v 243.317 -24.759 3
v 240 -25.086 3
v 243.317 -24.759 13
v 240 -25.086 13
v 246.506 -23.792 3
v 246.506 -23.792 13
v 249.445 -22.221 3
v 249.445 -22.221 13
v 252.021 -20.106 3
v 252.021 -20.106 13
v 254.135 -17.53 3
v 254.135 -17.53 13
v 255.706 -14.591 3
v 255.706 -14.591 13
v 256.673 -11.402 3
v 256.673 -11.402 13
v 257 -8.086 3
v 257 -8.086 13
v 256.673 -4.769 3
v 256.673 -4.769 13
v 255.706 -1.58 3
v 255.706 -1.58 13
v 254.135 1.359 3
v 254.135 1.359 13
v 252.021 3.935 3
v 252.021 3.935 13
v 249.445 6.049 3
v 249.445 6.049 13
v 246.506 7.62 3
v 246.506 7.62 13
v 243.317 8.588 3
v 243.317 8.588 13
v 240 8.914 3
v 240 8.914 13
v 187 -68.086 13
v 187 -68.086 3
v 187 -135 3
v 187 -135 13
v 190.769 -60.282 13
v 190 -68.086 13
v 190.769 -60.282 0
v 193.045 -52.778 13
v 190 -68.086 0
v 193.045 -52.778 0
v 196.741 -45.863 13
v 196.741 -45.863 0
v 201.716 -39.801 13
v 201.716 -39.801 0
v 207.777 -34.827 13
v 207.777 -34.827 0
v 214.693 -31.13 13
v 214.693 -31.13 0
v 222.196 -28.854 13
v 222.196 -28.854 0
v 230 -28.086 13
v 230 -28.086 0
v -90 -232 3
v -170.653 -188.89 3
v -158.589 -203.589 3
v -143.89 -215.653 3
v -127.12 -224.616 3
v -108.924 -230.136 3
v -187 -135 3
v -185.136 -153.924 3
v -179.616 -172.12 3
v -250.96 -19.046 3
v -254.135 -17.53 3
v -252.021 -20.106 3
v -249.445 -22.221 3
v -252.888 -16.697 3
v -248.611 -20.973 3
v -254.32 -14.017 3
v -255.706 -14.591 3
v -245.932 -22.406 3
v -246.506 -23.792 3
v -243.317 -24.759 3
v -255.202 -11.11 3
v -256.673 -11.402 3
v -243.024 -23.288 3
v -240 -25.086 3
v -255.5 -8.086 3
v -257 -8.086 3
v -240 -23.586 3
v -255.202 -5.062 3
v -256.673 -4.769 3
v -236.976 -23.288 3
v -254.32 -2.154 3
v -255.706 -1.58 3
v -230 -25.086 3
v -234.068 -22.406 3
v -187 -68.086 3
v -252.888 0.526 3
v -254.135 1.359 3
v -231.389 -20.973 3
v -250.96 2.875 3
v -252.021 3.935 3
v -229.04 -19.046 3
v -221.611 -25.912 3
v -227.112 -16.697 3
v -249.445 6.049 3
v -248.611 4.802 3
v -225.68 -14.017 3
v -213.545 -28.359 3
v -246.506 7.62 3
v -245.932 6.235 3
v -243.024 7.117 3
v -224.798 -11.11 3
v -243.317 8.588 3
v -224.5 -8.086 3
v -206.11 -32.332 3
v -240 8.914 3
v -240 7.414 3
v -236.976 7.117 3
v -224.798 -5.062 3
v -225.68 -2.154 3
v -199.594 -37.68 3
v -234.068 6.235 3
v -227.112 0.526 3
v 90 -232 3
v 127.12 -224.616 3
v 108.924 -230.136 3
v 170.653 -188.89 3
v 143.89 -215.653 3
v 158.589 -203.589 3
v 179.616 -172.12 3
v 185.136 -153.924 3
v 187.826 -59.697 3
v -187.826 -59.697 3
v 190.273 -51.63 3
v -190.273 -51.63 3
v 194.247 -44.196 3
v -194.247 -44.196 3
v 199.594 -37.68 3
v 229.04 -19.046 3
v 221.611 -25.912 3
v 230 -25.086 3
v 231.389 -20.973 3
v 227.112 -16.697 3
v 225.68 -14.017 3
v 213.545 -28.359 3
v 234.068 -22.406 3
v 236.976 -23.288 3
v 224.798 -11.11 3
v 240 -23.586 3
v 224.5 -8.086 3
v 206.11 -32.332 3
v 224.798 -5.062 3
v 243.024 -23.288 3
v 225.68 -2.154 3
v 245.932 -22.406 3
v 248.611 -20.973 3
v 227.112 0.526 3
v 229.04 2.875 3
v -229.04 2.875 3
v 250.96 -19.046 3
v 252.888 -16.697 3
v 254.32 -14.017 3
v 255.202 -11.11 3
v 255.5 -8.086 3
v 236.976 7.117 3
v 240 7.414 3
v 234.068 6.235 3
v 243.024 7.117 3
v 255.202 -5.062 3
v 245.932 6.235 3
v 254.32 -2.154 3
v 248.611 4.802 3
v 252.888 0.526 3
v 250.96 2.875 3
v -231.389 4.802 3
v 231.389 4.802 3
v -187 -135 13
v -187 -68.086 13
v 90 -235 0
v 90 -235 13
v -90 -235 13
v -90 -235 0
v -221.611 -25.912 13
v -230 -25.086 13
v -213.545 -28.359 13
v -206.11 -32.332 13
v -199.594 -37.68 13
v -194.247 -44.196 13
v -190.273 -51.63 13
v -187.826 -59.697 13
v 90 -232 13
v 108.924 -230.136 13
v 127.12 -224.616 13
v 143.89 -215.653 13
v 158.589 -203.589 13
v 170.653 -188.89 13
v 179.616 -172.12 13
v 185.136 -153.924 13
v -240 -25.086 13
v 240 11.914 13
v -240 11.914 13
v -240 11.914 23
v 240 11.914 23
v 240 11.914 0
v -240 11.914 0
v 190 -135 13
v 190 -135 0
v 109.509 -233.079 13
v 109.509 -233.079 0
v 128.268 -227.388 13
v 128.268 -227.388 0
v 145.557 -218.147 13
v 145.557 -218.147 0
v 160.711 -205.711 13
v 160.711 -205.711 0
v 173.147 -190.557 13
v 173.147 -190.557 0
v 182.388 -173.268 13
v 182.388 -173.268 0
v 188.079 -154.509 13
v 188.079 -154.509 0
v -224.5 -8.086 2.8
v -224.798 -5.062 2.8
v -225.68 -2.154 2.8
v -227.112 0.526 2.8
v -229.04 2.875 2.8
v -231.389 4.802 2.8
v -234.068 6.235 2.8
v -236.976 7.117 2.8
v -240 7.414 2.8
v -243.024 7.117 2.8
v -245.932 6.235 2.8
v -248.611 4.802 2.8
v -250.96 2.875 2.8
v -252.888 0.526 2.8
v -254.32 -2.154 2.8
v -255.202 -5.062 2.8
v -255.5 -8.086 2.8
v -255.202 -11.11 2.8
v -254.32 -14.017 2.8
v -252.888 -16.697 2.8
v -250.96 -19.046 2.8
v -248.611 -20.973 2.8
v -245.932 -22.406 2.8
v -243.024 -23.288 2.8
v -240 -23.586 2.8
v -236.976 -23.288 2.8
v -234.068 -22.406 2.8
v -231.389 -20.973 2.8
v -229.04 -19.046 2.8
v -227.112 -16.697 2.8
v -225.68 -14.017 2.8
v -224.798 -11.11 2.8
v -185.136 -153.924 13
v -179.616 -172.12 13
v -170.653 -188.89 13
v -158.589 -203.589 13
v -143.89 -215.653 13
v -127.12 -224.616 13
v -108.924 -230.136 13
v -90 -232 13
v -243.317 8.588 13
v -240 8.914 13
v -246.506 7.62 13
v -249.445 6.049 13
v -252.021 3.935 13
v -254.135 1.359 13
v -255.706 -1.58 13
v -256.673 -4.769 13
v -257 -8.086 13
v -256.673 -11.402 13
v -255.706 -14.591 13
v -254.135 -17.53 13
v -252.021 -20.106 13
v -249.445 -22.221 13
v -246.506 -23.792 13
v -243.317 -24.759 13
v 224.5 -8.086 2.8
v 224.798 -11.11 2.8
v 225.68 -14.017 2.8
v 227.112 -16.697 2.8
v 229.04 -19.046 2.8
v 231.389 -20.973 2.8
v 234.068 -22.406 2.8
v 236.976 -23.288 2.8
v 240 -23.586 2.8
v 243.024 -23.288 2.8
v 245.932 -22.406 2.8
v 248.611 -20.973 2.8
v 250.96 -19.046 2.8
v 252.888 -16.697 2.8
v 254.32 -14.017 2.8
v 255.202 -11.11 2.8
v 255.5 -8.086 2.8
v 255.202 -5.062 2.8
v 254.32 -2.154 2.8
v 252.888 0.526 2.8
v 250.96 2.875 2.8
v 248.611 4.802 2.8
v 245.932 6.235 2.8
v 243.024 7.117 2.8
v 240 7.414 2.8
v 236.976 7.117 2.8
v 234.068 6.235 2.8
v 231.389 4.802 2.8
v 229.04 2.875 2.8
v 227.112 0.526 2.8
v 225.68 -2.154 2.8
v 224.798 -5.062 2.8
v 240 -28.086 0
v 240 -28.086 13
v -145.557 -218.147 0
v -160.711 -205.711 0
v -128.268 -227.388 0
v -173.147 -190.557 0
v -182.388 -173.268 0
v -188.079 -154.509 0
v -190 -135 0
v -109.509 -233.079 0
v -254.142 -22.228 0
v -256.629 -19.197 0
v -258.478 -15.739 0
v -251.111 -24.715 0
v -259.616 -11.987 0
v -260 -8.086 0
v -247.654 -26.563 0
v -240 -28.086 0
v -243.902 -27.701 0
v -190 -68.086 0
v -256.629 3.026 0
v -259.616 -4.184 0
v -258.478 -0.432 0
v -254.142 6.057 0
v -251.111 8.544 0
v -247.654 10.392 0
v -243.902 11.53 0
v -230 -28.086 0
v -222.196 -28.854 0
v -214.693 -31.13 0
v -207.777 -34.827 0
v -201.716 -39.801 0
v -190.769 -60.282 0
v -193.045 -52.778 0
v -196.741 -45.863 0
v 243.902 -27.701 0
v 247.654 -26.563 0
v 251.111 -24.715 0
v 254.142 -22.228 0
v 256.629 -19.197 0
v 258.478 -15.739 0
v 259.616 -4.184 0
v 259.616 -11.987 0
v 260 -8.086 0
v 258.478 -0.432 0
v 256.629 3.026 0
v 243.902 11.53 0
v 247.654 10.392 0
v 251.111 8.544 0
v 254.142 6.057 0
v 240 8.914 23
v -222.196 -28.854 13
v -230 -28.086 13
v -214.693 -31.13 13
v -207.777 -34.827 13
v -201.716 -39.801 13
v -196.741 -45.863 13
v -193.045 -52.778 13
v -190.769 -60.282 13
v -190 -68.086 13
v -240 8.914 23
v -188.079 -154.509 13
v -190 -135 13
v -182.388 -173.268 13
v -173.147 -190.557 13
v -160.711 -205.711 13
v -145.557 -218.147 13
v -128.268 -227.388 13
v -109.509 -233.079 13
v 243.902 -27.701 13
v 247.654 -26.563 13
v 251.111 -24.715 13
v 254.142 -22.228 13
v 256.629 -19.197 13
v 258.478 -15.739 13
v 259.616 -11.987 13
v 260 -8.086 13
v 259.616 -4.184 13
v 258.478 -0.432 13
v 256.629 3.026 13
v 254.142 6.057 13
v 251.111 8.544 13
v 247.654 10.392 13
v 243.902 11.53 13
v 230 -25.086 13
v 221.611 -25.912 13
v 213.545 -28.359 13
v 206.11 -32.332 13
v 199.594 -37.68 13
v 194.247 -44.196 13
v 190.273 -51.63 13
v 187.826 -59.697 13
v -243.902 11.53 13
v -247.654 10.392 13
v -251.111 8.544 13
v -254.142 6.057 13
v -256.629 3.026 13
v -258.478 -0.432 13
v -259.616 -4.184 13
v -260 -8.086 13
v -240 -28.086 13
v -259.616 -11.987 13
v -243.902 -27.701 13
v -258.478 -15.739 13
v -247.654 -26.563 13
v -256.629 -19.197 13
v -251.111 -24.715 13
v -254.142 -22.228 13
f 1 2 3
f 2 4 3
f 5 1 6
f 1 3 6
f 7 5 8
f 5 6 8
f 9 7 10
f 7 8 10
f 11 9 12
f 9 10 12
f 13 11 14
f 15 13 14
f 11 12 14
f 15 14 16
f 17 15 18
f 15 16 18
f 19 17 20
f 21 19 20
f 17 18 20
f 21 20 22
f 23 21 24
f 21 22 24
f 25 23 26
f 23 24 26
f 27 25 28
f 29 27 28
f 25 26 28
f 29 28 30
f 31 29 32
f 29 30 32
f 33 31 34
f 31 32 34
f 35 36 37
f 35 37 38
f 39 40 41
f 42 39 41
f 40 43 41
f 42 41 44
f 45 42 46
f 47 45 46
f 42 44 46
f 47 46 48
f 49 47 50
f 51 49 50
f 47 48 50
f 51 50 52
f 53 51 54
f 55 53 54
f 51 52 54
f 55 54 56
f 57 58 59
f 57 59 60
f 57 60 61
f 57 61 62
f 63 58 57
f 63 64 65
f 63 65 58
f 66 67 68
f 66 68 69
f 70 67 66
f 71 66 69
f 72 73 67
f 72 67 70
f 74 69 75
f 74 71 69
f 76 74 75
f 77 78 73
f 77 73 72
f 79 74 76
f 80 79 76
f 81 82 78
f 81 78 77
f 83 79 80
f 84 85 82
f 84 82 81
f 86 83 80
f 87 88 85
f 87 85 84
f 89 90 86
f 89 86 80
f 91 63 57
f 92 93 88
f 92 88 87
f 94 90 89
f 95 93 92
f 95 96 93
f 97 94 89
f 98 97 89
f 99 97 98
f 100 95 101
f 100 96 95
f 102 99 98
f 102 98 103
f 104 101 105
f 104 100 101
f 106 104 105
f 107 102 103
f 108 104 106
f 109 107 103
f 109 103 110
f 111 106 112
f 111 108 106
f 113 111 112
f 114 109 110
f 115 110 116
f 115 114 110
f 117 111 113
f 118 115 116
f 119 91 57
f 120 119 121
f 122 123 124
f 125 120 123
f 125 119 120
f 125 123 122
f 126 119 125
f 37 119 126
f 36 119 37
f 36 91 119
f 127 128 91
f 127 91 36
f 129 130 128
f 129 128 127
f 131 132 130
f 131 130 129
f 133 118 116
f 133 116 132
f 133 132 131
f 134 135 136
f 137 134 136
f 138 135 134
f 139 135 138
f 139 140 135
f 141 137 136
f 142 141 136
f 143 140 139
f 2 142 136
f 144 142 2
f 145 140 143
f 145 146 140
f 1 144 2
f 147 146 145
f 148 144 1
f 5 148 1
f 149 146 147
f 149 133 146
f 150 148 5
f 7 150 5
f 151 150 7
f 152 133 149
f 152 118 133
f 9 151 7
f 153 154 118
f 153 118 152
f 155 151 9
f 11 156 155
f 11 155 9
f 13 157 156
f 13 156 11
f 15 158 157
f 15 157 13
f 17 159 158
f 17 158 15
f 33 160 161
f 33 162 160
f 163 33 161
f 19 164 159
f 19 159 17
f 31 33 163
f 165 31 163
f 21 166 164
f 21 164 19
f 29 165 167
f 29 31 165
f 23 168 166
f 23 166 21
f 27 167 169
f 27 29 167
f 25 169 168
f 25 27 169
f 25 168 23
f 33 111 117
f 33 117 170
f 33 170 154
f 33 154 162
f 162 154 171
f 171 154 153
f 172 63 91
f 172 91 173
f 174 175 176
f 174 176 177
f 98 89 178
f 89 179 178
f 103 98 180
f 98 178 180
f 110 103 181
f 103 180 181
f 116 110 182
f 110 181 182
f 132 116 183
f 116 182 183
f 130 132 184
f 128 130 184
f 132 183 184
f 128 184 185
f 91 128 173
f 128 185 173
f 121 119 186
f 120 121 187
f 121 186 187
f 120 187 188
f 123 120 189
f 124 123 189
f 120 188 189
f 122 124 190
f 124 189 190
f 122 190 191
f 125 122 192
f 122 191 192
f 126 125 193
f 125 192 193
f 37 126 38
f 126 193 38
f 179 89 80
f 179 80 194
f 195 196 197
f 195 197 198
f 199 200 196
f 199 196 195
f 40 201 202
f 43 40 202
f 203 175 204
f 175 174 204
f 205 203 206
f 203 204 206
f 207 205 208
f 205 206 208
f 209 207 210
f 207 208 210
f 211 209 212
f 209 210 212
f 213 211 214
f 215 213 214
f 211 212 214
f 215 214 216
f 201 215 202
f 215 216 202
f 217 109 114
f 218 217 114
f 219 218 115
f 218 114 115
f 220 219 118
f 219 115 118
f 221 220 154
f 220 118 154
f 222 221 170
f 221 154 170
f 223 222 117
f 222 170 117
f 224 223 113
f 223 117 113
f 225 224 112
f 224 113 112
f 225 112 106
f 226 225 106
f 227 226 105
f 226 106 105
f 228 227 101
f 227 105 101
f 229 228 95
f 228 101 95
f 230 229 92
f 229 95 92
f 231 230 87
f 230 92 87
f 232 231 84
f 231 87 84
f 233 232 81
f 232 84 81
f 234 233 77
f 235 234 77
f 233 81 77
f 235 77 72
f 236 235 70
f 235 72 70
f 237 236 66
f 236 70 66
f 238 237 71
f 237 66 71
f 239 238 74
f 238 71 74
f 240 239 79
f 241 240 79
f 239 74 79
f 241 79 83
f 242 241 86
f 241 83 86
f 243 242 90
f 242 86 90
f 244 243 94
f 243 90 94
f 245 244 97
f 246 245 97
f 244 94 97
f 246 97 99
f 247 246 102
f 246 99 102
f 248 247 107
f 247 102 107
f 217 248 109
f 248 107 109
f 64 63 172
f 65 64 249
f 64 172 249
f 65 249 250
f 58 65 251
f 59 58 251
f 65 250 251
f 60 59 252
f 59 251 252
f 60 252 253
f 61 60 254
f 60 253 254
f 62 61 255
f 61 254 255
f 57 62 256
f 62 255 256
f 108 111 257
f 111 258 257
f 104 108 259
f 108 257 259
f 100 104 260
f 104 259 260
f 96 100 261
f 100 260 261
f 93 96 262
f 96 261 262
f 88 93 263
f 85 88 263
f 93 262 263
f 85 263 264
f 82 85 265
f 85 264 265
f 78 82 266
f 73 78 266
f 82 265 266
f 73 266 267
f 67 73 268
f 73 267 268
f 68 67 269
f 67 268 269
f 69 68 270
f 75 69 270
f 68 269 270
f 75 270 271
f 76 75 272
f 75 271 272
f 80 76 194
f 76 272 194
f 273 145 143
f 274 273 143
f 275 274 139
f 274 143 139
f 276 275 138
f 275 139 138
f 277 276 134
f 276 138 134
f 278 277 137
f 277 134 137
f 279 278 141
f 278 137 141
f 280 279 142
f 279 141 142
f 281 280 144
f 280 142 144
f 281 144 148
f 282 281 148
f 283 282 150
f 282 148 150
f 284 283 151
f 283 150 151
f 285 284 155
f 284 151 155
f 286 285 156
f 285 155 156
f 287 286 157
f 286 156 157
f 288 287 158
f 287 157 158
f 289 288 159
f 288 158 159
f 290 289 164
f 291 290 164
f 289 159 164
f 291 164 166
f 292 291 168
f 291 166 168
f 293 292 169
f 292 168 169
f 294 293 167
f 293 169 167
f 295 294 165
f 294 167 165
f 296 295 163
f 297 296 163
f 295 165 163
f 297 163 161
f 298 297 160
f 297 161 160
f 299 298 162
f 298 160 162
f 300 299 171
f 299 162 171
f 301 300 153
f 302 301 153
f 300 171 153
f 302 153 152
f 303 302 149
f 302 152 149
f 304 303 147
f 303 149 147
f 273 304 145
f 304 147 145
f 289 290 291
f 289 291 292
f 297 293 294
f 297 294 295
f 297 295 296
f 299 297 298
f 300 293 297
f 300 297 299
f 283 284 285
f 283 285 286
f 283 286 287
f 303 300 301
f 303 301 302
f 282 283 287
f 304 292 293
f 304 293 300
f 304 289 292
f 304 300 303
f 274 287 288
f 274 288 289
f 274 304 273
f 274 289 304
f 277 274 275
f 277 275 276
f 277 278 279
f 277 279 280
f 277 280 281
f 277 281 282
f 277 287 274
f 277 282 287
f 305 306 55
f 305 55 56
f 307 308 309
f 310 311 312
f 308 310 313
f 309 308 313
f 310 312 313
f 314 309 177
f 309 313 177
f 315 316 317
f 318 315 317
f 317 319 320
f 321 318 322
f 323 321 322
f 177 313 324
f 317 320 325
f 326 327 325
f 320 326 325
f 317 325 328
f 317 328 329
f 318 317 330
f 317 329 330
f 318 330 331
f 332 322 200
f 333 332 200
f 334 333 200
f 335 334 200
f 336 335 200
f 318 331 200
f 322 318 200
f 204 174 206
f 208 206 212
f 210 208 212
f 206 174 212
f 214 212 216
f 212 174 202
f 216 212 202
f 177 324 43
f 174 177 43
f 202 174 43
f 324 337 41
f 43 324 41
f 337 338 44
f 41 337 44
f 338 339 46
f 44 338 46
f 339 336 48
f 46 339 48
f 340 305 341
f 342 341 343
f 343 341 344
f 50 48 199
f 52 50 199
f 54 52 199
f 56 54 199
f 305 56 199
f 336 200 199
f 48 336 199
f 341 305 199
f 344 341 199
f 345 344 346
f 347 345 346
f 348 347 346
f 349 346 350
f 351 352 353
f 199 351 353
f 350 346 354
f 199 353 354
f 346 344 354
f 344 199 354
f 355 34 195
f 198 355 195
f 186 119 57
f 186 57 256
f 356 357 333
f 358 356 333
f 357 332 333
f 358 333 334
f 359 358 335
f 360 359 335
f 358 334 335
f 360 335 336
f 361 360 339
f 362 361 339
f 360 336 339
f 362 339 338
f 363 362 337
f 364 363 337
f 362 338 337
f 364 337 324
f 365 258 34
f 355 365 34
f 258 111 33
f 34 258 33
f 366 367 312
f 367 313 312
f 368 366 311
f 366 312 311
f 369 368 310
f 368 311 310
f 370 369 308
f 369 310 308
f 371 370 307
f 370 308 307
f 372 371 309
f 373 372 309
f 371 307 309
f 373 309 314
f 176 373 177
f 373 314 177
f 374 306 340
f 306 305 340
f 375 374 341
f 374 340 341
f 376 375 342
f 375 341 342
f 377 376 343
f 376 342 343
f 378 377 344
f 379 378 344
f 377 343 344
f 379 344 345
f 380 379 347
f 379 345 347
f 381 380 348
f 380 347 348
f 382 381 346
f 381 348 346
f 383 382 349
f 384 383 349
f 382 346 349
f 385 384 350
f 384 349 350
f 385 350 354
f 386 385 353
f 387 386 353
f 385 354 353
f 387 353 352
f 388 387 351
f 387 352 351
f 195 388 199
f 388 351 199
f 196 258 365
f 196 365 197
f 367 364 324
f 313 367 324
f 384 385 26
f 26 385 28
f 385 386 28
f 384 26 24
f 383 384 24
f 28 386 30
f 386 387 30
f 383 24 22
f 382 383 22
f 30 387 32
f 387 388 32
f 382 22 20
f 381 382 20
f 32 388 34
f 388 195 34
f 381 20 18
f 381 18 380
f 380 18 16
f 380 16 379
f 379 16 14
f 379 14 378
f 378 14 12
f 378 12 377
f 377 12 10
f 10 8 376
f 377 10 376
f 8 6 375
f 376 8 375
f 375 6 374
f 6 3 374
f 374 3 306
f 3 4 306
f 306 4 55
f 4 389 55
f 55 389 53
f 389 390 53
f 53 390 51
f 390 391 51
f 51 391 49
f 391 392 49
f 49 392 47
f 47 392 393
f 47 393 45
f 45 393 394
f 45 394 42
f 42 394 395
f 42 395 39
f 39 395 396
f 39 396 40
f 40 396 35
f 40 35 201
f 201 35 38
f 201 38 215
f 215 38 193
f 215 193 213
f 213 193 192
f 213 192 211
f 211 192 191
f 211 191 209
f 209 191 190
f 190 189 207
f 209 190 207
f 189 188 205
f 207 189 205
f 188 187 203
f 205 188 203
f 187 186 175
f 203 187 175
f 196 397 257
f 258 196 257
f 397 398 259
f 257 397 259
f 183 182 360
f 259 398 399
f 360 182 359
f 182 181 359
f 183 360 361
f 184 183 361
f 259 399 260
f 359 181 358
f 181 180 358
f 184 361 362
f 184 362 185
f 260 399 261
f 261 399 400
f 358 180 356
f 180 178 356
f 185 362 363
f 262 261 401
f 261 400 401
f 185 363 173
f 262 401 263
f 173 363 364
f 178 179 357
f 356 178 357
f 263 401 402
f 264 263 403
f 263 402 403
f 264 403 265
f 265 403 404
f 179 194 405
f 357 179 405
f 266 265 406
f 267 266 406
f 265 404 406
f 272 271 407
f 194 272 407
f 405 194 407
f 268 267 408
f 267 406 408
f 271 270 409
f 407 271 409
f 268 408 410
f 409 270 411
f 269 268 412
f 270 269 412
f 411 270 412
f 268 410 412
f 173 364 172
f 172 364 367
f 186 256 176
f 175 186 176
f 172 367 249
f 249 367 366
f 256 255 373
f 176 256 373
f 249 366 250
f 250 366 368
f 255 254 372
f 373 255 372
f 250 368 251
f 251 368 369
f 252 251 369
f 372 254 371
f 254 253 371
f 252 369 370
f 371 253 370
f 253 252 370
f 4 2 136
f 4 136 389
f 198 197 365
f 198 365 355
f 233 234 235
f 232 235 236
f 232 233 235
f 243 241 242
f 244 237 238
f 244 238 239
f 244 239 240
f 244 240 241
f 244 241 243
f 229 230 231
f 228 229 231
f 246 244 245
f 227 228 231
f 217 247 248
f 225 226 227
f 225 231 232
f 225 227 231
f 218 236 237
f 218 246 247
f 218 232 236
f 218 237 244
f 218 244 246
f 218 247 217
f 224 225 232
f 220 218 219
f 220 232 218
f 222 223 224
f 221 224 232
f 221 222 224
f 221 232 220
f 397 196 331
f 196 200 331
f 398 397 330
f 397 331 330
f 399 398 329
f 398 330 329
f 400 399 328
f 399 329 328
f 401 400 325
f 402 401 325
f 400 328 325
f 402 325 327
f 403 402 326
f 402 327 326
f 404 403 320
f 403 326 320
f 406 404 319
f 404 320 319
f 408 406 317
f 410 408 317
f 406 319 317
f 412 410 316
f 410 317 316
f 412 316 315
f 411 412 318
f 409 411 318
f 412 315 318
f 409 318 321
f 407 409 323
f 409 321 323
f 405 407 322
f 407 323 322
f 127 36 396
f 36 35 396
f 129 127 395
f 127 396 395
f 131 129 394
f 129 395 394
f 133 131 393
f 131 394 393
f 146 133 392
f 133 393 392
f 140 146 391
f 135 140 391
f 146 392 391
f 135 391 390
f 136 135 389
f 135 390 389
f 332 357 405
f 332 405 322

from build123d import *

# Parameters (mm, degrees)
BOSS_EXTRUDE1_DEPTH = 3
SKETCH2_W           = 480
SKETCH2_H           = 3
BOSS_EXTRUDE2_DEPTH = 20
SKETCH3_R           = 15.5
CUT_EXTRUDE1_DEPTH  = 0.2
SKETCH4_W           = 10
SKETCH4_H           = 3


with BuildPart() as part:
    # Sketch1 → Boss-Extrude1 (new body)
    with BuildSketch(Plane.XY):
        with BuildLine():
            Line((-240, -28.085620227), (-230, -28.085620227))
            ThreePointArc((-230, -28.085620227), (-201.715728753, -39.80134898), (-190, -68.085620227))
            Line((-190, -68.085620227), (-190, -135))
            ThreePointArc((-190, -135), (-160.710678119, -205.710678119), (-90, -235))
            Line((-90, -235), (90, -235))
            ThreePointArc((90, -235), (160.710678119, -205.710678119), (190, -135))
            Line((190, -135), (190, -68.085620227))
            ThreePointArc((190, -68.085620227), (201.715728753, -39.80134898), (230, -28.085620227))
            Line((230, -28.085620227), (240, -28.085620227))
            ThreePointArc((240, -28.085620227), (260, -8.085620227), (240, 11.914379773))
            Line((240, 11.914379773), (-240, 11.914379773))
            ThreePointArc((-240, 11.914379773), (-260, -8.085620227), (-240, -28.085620227))
        make_face()
    extrude(amount=BOSS_EXTRUDE1_DEPTH)

    # Sketch2 → Boss-Extrude2 (add)
    with BuildSketch(Plane.XY.offset(3)):
        with Locations((0, 10.414379773)):
            Rectangle(SKETCH2_W, SKETCH2_H)
    extrude(amount=BOSS_EXTRUDE2_DEPTH)

    # Sketch3 → Cut-Extrude1 (cut)
    with BuildSketch(Plane.XY.offset(3)):
        with Locations((-240, -8.085620227)):
            Circle(SKETCH3_R)
        with Locations(Location((240, -8.085620227, 0), (0, 0, 180))):
            Circle(SKETCH3_R)
    extrude(amount=-CUT_EXTRUDE1_DEPTH, mode=Mode.SUBTRACT)

    # Sweep1: sweep along a path in Sketch5
    with BuildLine(Plane.XY.offset(3)) as sweep1_path:
        ThreePointArc((-240, 11.914379773), (-260, -8.085620227), (-240, -28.085620227))
        Line((-240, -28.085620227), (-230, -28.085620227))
        ThreePointArc((-230, -28.085620227), (-201.715728753, -39.80134898), (-190, -68.085620227))
        Line((-190, -68.085620227), (-190, -135))
        ThreePointArc((-190, -135), (-160.710678119, -205.710678119), (-90, -235))
        Line((-90, -235), (90, -235))
        ThreePointArc((90, -235), (160.710678119, -205.710678119), (190, -135))
        Line((190, -135), (190, -68.085620227))
        ThreePointArc((190, -68.085620227), (201.715728753, -39.80134898), (230, -28.085620227))
        Line((230, -28.085620227), (240, -28.085620227))
        ThreePointArc((240, -28.085620227), (260, -8.085620227), (240, 11.914379773))
    # Sketch4 → Sweep1 (sweep)
    with BuildSketch(Plane.ZY.offset(240)):
        with Locations((8, 10.414379773)):
            Rectangle(SKETCH4_W, SKETCH4_H)
    sweep(path=sweep1_path.line)


solid = part.part
